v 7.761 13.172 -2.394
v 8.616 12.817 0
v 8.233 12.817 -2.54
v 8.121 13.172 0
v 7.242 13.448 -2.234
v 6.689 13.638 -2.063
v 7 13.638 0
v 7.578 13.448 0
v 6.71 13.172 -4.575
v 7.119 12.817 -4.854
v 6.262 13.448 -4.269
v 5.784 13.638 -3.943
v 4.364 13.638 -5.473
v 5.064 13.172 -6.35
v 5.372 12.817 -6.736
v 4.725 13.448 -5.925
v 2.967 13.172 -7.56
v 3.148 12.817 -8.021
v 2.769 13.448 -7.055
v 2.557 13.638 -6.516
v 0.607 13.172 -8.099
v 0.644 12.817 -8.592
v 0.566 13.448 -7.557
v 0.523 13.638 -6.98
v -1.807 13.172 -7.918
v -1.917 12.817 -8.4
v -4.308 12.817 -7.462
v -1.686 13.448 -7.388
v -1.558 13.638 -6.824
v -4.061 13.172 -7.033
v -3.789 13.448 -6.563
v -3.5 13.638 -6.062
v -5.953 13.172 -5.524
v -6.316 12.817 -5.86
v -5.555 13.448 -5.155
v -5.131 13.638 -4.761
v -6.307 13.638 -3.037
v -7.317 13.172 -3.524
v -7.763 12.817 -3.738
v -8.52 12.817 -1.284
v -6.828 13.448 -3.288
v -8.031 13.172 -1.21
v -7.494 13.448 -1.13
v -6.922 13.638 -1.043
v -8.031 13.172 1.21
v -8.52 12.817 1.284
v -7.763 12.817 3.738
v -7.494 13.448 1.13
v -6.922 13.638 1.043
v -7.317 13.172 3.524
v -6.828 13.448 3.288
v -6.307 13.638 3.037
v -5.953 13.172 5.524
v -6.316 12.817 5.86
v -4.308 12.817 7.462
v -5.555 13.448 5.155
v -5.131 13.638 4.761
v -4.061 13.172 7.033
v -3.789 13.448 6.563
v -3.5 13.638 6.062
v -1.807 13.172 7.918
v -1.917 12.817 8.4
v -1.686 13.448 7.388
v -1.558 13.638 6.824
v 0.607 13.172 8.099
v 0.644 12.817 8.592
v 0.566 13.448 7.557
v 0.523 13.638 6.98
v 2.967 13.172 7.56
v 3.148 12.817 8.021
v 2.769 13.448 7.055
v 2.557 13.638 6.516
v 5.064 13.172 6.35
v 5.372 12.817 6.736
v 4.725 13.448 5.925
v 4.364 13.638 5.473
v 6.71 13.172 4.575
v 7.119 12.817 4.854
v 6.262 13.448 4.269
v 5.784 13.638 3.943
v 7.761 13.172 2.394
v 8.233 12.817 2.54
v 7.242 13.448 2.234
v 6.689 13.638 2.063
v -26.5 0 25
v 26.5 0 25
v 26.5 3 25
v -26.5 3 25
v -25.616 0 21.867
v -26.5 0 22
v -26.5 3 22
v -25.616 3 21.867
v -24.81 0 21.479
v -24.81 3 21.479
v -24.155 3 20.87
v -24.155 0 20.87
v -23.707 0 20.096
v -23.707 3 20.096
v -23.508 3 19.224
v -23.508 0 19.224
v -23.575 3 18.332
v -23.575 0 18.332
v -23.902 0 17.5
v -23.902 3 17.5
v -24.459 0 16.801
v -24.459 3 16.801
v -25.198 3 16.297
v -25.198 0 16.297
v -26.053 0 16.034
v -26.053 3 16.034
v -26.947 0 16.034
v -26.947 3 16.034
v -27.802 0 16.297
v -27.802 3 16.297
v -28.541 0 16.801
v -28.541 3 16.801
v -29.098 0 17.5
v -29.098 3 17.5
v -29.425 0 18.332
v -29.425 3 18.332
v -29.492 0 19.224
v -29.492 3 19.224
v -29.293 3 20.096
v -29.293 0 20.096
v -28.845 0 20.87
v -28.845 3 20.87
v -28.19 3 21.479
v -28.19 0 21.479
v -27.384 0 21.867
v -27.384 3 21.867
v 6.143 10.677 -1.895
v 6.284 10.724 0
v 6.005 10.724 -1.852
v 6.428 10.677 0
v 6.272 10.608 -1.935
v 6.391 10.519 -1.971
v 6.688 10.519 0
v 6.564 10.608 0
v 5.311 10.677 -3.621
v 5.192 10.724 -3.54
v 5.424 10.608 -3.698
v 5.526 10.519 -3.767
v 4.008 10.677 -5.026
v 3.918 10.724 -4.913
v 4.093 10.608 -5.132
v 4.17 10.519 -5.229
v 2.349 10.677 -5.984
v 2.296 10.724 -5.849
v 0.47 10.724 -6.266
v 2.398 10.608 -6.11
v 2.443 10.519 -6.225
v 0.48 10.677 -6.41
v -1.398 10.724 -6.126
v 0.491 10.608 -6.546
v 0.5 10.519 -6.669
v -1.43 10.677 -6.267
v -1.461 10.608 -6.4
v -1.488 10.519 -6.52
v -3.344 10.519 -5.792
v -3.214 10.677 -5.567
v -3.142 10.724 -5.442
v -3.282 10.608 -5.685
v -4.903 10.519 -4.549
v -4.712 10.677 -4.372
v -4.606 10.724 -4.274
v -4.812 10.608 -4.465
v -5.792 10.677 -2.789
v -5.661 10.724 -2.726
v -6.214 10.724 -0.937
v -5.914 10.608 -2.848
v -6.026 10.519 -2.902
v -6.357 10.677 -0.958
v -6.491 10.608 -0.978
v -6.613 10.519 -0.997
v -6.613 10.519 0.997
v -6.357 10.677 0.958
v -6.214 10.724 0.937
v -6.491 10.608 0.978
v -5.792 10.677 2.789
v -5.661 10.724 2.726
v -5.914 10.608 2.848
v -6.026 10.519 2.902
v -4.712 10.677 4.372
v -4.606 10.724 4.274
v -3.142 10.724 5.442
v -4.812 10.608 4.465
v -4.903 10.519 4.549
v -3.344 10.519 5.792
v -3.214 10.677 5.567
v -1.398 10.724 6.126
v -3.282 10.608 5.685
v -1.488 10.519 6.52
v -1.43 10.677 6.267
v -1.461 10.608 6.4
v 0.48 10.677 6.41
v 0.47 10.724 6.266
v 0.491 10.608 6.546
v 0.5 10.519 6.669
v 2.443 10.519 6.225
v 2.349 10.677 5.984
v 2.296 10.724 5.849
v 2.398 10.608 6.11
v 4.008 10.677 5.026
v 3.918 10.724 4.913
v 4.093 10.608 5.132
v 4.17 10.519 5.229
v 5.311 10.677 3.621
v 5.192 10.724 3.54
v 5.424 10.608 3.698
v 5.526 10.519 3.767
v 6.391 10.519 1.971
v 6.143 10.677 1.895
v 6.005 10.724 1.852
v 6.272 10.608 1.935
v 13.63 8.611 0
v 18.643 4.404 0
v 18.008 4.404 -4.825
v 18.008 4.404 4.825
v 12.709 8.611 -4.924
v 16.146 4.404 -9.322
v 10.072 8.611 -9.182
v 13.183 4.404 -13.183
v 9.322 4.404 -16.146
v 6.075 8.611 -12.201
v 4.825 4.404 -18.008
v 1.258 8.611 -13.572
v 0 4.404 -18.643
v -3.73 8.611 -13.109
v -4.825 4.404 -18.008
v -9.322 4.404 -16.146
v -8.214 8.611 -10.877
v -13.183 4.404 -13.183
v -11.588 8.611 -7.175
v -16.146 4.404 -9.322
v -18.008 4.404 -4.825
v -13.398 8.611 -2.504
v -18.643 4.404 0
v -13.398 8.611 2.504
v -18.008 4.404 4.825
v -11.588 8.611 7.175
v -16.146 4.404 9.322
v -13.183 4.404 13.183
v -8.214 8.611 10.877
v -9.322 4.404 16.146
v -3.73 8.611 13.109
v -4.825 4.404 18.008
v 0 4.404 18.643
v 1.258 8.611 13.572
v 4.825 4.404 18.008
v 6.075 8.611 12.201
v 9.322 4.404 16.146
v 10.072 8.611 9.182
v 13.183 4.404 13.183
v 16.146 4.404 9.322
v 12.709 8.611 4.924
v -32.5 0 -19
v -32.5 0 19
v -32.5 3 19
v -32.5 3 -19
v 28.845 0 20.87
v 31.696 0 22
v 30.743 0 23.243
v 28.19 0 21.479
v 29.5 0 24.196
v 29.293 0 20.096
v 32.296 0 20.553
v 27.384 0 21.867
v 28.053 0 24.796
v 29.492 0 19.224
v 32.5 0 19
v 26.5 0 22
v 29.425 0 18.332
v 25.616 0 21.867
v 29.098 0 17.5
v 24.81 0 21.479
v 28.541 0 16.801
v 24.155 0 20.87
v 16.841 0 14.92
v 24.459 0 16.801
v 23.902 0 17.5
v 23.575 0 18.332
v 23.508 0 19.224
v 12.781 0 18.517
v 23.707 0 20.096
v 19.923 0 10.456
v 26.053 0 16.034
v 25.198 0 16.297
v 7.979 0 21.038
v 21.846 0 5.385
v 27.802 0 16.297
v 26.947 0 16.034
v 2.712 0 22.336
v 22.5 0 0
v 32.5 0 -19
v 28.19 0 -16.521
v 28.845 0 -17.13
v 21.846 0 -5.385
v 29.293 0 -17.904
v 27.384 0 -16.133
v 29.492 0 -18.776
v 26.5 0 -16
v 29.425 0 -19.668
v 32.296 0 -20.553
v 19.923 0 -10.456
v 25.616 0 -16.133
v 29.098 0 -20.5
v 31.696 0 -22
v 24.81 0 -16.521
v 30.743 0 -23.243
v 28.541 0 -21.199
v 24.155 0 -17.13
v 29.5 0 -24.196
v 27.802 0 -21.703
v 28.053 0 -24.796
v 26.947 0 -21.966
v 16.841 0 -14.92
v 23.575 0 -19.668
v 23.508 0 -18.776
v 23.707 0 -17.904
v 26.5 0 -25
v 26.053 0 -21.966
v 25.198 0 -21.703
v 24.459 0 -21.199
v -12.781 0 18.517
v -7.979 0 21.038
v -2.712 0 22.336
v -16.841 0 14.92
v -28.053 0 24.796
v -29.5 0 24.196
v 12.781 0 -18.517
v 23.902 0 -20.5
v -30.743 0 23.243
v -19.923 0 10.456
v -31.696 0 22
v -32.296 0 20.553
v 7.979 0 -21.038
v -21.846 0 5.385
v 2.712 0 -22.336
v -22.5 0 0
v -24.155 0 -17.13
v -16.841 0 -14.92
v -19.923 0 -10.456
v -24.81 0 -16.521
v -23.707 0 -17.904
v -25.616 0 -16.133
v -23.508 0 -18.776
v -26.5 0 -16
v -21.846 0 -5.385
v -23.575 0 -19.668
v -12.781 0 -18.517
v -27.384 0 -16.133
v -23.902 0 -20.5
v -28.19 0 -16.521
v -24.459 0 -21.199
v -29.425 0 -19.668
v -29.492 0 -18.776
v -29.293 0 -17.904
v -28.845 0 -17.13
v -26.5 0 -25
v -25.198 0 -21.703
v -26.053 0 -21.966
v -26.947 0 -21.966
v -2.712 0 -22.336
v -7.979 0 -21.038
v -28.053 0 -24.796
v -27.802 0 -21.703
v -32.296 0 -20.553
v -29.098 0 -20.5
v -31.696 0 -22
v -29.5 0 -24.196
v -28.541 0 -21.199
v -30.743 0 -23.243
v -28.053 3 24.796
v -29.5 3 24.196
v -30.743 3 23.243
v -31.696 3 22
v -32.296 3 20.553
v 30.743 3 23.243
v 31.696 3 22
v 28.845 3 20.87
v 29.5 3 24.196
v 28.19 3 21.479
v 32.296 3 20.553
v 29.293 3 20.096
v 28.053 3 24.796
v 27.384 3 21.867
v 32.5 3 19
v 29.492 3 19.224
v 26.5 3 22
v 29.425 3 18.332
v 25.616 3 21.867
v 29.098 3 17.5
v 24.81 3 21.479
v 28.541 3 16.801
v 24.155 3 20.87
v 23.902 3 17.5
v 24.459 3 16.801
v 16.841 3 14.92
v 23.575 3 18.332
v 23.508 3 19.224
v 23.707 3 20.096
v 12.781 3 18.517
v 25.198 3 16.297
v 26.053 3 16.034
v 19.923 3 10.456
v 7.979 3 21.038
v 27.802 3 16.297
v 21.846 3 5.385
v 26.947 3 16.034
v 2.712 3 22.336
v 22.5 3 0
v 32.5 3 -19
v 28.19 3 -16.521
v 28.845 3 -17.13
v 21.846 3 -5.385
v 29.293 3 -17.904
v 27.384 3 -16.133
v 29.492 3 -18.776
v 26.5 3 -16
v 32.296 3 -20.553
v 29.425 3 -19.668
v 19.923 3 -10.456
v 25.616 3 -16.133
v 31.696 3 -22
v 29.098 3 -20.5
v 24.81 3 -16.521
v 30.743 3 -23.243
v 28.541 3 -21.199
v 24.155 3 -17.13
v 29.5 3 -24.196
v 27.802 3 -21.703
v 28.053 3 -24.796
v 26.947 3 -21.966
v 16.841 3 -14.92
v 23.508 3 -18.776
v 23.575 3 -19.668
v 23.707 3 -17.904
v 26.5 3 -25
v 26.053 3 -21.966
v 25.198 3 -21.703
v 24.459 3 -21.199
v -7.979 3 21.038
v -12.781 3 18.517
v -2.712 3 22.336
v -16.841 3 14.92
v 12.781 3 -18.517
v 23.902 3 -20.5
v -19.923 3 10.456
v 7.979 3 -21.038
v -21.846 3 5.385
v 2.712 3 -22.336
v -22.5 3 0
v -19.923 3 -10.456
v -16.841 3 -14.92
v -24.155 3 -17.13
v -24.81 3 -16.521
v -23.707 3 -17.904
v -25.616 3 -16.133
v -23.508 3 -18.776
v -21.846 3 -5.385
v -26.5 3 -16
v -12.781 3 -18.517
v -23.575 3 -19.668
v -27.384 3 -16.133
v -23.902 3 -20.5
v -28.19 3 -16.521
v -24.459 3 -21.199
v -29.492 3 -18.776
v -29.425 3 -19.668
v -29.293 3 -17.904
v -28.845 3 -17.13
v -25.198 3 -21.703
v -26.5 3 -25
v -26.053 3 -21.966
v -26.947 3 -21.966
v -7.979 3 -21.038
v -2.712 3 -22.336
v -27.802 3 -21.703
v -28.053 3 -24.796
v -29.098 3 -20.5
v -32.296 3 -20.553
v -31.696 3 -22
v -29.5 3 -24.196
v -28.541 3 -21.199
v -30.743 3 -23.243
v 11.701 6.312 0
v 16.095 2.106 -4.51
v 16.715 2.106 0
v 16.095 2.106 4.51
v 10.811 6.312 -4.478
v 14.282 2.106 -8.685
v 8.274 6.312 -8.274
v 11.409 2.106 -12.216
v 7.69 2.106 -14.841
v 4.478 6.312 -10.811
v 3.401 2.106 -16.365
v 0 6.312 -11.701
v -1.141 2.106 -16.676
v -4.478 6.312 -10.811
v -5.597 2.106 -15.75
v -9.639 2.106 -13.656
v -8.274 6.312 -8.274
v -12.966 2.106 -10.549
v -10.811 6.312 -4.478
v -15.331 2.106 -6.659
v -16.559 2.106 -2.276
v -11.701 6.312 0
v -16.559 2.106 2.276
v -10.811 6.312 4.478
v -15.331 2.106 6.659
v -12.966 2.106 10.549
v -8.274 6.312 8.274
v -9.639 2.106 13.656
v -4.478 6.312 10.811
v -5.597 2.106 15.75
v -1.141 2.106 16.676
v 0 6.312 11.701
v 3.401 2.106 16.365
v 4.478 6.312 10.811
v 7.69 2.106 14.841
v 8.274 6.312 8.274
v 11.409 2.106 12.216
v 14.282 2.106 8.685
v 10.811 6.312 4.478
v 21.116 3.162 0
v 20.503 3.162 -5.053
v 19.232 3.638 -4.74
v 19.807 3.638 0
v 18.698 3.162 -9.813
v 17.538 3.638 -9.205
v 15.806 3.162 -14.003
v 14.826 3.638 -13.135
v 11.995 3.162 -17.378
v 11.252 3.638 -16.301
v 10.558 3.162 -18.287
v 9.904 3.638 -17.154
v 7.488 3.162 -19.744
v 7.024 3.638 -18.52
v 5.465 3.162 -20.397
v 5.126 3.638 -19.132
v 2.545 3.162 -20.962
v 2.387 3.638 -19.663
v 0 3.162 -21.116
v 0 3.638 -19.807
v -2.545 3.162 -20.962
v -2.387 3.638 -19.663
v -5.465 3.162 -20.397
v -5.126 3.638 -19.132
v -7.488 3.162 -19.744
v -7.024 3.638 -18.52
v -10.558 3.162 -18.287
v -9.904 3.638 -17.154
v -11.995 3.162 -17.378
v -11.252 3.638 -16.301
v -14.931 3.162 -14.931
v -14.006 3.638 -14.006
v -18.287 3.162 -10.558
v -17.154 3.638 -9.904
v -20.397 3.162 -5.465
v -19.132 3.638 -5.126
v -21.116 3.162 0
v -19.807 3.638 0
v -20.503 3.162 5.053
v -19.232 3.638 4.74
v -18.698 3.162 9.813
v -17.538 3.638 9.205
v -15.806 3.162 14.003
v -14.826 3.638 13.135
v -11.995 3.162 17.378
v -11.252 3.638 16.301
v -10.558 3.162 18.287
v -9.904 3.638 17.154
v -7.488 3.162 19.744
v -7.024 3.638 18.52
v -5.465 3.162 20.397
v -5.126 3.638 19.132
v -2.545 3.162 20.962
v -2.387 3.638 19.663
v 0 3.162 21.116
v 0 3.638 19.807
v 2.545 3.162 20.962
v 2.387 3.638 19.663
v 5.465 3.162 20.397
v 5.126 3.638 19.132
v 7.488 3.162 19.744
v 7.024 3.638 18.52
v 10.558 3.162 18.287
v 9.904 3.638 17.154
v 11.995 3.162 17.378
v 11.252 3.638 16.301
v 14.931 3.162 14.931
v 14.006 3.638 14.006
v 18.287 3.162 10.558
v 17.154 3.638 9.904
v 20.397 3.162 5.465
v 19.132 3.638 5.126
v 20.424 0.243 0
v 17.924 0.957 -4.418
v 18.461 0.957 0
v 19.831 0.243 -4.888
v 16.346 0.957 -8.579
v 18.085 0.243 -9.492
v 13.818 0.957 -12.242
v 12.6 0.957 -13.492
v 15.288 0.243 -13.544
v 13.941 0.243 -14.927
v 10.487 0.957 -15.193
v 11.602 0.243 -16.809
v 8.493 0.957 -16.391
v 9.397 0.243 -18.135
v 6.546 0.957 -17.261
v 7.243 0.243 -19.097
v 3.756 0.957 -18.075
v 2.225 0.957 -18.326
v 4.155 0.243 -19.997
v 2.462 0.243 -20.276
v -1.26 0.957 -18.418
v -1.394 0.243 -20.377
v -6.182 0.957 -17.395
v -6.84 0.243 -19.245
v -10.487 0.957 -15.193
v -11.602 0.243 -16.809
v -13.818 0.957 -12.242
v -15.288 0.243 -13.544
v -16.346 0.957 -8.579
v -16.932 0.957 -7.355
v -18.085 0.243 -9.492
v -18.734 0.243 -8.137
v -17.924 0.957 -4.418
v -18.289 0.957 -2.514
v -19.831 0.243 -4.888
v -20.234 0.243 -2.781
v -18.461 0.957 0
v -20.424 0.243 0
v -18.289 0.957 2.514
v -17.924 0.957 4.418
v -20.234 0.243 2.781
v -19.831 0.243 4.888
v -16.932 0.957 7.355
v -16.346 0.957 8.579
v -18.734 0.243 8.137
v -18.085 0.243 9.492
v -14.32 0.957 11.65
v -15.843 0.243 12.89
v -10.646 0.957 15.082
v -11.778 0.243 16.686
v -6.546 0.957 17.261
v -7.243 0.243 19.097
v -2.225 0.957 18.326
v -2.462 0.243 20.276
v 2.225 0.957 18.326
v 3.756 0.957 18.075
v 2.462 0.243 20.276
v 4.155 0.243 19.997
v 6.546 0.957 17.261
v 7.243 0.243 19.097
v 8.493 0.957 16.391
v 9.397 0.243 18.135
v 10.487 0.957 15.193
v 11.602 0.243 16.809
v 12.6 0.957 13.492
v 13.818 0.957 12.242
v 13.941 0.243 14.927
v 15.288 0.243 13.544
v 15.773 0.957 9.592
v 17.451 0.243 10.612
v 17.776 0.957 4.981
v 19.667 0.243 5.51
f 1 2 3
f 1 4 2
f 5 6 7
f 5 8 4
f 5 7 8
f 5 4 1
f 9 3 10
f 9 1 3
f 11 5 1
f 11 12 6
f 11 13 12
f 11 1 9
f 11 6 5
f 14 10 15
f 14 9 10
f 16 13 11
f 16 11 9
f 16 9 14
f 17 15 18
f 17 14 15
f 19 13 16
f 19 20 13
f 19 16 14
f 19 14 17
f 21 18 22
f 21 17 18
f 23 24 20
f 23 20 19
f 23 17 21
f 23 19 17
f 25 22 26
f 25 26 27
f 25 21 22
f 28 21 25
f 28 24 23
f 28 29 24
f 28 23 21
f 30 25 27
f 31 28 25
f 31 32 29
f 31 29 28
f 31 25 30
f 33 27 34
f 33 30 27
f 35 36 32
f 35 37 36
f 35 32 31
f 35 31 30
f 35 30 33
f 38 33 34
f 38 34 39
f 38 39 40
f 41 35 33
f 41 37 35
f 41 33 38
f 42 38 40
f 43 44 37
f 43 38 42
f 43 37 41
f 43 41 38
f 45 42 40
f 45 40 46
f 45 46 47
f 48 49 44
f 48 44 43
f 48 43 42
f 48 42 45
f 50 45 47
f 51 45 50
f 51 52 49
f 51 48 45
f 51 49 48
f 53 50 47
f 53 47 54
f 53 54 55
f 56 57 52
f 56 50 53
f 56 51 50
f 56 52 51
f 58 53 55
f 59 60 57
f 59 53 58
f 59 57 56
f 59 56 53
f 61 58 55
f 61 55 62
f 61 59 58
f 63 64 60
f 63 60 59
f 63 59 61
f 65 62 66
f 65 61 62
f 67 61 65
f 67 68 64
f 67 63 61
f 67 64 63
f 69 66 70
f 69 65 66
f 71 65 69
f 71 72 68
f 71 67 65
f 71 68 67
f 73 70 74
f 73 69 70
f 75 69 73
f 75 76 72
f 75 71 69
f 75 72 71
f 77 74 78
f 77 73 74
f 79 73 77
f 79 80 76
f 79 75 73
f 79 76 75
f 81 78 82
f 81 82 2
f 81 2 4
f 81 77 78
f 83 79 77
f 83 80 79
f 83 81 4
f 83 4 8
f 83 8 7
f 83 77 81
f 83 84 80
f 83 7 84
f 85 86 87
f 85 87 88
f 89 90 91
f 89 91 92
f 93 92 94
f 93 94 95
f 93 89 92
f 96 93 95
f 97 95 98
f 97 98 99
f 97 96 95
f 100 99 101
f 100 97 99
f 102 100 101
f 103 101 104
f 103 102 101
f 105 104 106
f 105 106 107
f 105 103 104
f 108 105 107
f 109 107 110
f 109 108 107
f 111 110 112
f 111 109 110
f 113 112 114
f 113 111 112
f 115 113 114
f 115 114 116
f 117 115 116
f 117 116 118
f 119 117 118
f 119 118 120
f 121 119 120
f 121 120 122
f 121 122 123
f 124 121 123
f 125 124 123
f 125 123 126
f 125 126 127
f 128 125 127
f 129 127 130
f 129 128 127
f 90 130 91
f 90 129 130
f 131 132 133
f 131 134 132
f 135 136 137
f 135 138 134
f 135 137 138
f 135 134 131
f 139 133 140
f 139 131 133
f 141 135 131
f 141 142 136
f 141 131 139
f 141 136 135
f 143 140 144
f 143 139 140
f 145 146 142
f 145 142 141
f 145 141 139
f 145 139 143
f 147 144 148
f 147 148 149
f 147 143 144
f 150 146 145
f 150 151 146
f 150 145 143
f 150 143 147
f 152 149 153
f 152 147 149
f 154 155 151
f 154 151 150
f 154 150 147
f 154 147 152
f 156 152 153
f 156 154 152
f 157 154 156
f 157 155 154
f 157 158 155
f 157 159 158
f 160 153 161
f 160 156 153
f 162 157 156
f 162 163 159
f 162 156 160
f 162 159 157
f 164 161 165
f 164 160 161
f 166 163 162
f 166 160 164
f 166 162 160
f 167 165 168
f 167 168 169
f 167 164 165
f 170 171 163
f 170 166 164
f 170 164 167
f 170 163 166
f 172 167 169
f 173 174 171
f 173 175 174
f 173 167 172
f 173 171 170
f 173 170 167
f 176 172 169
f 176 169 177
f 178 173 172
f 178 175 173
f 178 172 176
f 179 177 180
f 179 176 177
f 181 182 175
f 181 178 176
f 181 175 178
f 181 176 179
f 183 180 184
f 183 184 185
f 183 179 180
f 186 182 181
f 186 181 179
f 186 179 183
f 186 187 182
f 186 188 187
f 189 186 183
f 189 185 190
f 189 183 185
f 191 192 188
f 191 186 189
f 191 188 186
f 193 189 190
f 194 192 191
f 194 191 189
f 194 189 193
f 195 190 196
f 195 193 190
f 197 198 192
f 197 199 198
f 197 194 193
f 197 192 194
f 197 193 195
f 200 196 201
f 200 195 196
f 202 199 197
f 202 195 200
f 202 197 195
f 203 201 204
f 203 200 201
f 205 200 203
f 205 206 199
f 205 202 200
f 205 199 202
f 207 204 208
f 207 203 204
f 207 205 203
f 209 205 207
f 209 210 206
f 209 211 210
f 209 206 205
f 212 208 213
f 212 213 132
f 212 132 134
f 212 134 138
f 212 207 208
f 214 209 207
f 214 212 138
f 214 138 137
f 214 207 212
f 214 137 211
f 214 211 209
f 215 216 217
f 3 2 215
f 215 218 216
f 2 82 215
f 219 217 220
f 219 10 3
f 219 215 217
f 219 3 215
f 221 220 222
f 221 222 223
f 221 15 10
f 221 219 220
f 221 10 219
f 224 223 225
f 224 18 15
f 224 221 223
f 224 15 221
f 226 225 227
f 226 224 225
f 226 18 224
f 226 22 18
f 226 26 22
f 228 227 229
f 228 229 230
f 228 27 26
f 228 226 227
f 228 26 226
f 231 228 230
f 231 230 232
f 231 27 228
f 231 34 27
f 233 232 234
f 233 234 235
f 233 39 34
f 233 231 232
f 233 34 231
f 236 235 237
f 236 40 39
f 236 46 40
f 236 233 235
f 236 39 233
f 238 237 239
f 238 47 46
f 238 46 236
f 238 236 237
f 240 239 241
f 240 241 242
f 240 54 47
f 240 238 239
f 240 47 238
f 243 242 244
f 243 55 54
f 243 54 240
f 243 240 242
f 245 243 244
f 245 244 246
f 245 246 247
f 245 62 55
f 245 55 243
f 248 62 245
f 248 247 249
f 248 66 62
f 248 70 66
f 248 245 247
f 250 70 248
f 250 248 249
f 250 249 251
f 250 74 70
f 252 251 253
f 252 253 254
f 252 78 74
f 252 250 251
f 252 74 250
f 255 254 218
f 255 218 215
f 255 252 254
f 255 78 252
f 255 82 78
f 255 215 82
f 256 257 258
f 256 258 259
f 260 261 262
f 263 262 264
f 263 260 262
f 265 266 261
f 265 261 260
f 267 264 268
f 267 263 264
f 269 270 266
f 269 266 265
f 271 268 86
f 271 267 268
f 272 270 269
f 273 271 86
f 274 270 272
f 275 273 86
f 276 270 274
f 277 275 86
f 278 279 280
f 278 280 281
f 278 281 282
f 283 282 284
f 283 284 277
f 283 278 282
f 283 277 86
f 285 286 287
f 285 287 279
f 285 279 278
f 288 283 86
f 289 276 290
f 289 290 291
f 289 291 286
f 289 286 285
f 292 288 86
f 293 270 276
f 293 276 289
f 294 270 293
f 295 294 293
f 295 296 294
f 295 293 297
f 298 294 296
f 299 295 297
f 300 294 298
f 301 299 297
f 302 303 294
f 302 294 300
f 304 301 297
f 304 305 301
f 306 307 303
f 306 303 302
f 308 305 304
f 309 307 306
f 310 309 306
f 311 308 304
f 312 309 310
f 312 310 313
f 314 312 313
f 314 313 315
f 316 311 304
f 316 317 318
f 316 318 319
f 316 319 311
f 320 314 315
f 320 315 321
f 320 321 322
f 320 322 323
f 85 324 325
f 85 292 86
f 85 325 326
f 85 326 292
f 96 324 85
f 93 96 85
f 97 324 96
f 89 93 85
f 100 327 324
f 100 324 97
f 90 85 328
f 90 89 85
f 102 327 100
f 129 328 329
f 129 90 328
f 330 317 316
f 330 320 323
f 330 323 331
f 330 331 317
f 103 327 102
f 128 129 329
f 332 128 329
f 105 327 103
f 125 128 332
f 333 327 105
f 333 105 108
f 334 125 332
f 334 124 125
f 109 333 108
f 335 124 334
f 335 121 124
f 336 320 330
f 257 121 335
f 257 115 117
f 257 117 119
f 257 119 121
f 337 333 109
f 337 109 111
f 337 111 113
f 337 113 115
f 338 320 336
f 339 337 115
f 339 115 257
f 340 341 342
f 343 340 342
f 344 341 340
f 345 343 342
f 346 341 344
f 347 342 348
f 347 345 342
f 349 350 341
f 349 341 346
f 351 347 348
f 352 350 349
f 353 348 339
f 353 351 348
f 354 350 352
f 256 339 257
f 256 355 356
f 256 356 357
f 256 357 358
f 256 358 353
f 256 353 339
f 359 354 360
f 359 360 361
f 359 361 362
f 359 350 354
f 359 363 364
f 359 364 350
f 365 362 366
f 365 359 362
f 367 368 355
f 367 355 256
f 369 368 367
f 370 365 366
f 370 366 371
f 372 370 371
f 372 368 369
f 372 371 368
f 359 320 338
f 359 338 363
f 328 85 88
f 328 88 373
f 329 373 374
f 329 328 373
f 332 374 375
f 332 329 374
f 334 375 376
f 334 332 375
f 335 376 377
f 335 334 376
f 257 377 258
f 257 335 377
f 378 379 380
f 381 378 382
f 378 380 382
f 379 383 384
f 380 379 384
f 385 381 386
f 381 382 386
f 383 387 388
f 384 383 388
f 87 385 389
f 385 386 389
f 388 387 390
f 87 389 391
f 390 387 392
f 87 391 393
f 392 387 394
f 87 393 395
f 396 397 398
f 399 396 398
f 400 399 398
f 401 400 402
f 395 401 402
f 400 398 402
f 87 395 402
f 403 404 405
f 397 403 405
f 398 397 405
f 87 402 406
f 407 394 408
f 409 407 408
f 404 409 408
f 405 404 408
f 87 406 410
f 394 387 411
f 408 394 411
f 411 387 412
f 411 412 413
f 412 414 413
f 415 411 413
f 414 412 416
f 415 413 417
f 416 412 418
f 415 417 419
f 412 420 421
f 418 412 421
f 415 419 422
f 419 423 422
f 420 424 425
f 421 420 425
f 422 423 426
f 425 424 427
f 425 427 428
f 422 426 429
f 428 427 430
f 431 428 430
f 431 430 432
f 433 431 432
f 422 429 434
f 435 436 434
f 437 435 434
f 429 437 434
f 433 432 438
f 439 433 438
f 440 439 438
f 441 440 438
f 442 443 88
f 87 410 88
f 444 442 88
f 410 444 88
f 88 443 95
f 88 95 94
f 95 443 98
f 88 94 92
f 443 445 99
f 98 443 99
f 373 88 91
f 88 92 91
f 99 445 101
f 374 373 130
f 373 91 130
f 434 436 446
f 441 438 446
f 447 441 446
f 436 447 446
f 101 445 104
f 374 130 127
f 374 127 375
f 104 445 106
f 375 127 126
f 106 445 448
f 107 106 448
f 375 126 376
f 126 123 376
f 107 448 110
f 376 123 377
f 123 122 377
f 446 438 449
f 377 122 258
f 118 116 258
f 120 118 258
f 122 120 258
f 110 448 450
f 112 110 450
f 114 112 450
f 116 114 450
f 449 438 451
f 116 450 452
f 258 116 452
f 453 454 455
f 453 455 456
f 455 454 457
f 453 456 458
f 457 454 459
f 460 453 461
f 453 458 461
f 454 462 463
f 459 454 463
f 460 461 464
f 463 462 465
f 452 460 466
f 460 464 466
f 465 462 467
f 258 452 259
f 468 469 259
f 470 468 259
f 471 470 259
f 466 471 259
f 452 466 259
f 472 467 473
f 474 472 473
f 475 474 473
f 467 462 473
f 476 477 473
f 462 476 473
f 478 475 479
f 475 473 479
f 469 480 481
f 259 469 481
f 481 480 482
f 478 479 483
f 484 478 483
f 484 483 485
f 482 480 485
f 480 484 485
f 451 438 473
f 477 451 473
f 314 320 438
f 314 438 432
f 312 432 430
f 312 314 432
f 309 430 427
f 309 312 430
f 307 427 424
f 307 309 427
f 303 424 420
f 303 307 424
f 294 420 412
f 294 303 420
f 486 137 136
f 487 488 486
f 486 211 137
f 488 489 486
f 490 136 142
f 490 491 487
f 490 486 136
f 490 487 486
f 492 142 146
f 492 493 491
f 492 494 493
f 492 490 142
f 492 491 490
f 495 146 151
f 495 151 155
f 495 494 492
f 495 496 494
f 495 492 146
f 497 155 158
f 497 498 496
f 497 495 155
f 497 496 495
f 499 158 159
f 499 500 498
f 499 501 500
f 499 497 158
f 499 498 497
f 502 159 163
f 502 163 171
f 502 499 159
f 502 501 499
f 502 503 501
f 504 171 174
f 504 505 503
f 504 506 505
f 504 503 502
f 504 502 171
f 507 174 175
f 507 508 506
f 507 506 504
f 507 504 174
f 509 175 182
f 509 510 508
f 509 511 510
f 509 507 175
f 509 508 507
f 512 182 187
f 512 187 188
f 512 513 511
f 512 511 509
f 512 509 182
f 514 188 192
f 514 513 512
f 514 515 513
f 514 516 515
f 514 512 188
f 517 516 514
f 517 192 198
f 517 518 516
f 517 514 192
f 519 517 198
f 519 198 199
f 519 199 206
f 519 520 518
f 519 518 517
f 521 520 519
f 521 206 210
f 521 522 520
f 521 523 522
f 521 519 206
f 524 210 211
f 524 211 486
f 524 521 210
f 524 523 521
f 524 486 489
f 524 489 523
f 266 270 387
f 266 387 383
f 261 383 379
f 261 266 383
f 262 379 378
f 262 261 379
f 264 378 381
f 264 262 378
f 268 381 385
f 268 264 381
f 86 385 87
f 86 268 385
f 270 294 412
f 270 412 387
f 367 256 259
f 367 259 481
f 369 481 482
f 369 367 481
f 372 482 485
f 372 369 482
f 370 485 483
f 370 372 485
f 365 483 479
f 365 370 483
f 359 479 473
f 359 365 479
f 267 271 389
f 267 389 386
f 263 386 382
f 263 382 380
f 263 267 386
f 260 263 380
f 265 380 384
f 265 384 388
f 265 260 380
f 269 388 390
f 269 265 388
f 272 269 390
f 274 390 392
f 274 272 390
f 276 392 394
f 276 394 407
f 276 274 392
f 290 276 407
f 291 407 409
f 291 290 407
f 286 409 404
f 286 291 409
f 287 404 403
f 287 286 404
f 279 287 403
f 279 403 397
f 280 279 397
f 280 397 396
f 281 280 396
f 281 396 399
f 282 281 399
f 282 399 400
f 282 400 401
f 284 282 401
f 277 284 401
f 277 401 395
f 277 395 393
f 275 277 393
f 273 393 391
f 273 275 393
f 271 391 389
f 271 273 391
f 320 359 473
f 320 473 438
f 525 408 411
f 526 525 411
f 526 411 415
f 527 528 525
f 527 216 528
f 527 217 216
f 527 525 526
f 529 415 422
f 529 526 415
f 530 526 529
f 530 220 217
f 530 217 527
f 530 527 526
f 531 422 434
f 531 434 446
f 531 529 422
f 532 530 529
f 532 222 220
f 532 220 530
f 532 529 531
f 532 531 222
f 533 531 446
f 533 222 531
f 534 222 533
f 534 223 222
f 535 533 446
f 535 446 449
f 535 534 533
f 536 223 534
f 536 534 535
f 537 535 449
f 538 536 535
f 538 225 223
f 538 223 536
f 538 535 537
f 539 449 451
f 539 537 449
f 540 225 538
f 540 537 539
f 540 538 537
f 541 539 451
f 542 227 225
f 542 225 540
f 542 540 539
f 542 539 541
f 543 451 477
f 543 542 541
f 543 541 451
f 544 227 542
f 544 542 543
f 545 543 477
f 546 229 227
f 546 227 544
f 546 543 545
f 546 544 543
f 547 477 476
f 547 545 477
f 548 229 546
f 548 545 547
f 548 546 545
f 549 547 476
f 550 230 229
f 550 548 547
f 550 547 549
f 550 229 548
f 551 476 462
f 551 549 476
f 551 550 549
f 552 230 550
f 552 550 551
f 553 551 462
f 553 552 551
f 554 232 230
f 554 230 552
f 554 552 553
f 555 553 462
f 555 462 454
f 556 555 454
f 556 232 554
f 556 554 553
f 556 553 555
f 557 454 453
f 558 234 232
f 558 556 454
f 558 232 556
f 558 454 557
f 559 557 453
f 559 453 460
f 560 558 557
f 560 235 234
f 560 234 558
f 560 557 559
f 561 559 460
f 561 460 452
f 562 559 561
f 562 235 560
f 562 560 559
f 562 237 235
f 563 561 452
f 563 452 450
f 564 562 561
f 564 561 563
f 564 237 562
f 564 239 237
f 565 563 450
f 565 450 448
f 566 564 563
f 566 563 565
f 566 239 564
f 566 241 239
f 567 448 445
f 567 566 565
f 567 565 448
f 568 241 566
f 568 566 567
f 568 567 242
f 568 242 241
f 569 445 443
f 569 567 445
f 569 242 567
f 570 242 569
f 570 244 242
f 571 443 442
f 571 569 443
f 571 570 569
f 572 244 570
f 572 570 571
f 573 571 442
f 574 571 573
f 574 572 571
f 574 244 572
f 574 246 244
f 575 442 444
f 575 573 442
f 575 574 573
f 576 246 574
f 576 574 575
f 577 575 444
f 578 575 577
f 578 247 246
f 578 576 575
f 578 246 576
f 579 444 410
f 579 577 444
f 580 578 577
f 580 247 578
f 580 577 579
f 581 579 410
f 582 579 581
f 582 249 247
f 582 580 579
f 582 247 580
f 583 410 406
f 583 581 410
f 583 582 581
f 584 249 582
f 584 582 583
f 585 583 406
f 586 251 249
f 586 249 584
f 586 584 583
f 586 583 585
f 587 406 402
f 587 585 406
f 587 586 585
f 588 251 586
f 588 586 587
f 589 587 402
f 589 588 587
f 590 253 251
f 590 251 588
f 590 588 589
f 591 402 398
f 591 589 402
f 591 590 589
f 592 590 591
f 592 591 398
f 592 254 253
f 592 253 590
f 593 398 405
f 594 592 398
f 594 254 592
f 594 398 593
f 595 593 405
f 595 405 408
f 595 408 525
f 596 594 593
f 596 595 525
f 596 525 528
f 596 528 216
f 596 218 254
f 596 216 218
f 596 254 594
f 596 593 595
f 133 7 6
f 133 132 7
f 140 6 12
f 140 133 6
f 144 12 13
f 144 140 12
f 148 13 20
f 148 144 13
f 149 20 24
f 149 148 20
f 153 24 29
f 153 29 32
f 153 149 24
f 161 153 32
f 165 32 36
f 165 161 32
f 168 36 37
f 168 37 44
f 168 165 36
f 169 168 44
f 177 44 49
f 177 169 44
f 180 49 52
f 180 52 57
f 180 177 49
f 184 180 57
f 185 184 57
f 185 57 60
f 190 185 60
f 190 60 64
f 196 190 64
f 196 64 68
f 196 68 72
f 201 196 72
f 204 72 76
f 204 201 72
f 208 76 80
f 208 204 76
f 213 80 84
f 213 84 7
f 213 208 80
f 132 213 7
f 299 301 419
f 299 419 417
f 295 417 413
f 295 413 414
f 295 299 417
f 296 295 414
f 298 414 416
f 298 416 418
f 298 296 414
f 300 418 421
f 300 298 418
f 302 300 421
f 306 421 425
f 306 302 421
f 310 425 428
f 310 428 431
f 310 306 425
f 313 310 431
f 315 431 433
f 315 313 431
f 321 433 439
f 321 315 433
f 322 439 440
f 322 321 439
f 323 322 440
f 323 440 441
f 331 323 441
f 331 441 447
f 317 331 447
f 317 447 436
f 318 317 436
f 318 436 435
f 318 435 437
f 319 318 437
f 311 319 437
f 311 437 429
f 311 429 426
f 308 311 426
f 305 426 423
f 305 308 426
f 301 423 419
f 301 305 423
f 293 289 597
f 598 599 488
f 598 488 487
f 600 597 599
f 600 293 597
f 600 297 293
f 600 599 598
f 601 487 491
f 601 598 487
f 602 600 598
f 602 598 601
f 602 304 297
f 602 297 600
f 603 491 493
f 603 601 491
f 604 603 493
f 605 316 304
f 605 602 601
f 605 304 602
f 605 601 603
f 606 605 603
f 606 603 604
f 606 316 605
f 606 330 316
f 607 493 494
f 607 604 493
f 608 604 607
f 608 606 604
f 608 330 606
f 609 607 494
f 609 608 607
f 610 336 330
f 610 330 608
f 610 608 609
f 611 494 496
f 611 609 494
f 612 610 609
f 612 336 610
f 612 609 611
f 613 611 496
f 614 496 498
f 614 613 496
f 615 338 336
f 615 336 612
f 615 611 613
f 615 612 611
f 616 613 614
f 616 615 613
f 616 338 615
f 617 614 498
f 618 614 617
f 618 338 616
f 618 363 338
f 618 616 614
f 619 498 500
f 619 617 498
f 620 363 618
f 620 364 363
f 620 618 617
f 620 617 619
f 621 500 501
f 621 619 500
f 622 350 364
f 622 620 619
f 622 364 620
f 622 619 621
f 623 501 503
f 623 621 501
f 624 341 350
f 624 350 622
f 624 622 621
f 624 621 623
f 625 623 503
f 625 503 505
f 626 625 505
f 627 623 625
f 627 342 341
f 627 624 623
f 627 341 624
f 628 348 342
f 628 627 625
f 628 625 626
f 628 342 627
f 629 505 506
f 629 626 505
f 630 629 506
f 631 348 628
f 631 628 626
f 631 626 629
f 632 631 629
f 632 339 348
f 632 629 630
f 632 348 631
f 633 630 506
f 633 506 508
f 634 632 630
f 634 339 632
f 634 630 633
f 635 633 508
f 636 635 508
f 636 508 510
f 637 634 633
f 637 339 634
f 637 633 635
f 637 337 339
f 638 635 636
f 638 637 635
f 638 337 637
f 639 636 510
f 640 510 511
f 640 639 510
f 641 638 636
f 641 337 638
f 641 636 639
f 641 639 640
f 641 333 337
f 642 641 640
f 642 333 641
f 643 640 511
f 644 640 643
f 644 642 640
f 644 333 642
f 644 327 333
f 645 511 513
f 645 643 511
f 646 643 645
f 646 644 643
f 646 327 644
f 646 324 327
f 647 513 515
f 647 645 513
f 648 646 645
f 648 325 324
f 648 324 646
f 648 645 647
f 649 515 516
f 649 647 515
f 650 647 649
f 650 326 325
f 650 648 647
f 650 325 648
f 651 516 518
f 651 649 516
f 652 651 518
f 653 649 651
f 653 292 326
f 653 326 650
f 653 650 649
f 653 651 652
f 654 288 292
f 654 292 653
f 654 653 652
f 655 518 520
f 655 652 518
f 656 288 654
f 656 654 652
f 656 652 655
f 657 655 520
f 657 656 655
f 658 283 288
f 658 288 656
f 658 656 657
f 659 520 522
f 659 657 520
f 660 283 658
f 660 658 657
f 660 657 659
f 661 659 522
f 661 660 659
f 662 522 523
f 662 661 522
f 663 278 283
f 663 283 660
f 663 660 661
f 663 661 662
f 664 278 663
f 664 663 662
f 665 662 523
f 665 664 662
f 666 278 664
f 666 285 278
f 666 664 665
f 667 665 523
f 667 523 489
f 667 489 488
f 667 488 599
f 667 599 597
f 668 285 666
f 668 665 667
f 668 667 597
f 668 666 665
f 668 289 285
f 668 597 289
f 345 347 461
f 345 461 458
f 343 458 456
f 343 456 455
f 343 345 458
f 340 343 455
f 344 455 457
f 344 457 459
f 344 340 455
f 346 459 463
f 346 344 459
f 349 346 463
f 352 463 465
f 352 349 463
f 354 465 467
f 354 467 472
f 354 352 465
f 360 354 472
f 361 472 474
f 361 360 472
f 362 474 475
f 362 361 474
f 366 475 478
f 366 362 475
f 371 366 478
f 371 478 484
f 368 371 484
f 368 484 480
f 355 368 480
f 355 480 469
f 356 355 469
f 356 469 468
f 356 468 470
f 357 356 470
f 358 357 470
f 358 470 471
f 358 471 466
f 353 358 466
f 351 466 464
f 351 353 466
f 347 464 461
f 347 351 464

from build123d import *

# Parameters (mm, degrees)
SKETCH1_R           = 3
SKETCH1_R_2         = 22.5
BOSS_EXTRUDE1_DEPTH = 3


with BuildPart() as part:
    # Sketch1 → Boss-Extrude1 (new body)
    with BuildSketch(Plane(origin=(0, 0, 0), x_dir=(1, 0, 0), z_dir=(0, 1, 0))):
        with BuildLine():
            Line((-26.5, 25), (26.5, 25))
            ThreePointArc((26.5, 25), (30.742640687, 23.242640687), (32.5, 19))
            Line((32.5, 19), (32.5, -19))
            ThreePointArc((32.5, -19), (30.742640687, -23.242640687), (26.5, -25))
            Line((26.5, -25), (-26.5, -25))
            ThreePointArc((-26.5, -25), (-30.742640687, -23.242640687), (-32.5, -19))
            Line((-32.5, -19), (-32.5, 19))
            ThreePointArc((-32.5, 19), (-30.742640687, 23.242640687), (-26.5, 25))
        make_face()
        with Locations(Location((-26.5, 19, 0), (0, 0, 270))):
            Circle(SKETCH1_R, mode=Mode.SUBTRACT)
        with Locations(Location((26.5, 19, 0), (0, 0, 270))):
            Circle(SKETCH1_R, mode=Mode.SUBTRACT)
        with Locations(Location((26.5, -19, 0), (0, 0, 270))):
            Circle(SKETCH1_R, mode=Mode.SUBTRACT)
        with Locations(Location((-26.5, -19, 0), (0, 0, 270))):
            Circle(SKETCH1_R, mode=Mode.SUBTRACT)
        with Locations(Location((0, 0, 0), (0, 0, 270))):
            Circle(SKETCH1_R_2, mode=Mode.SUBTRACT)
    extrude(amount=BOSS_EXTRUDE1_DEPTH)

    # Sketch2 → Revolve3 (revolve)
    with BuildSketch(Plane.XY, mode=Mode.PRIVATE) as revolve3_sk:
        with BuildLine():
            Line((-18.643274342, 4.403733341), (-8.616164915, 12.817477163))
            ThreePointArc((-8.616164915, 12.817477163), (-7.85514437, 13.320291088), (-7, 13.637627215))
            Line((-7, 13.637627215), (-6.283760857, 10.724381347))
            ThreePointArc((-6.283760857, 10.724381347), (-6.49754695, 10.645047315), (-6.687802086, 10.519343834))
            Line((-6.687802086, 10.519343834), (-16.714911513, 2.105600012))
            ThreePointArc((-16.714911513, 2.105600012), (-19.42181871, 0.542766413), (-22.5, 0))
            Line((-22.5, 0), (-22.5, 3))
            ThreePointArc((-22.5, 3), (-20.44787914, 3.361844275), (-18.643274342, 4.403733341))
        make_face()
    revolve(revolve3_sk.sketch.rotate(Axis((0, 0, 0), (0, 1, 0)), 180), axis=Axis((0, 0, 0), (0, 1, 0)))


solid = part.part
